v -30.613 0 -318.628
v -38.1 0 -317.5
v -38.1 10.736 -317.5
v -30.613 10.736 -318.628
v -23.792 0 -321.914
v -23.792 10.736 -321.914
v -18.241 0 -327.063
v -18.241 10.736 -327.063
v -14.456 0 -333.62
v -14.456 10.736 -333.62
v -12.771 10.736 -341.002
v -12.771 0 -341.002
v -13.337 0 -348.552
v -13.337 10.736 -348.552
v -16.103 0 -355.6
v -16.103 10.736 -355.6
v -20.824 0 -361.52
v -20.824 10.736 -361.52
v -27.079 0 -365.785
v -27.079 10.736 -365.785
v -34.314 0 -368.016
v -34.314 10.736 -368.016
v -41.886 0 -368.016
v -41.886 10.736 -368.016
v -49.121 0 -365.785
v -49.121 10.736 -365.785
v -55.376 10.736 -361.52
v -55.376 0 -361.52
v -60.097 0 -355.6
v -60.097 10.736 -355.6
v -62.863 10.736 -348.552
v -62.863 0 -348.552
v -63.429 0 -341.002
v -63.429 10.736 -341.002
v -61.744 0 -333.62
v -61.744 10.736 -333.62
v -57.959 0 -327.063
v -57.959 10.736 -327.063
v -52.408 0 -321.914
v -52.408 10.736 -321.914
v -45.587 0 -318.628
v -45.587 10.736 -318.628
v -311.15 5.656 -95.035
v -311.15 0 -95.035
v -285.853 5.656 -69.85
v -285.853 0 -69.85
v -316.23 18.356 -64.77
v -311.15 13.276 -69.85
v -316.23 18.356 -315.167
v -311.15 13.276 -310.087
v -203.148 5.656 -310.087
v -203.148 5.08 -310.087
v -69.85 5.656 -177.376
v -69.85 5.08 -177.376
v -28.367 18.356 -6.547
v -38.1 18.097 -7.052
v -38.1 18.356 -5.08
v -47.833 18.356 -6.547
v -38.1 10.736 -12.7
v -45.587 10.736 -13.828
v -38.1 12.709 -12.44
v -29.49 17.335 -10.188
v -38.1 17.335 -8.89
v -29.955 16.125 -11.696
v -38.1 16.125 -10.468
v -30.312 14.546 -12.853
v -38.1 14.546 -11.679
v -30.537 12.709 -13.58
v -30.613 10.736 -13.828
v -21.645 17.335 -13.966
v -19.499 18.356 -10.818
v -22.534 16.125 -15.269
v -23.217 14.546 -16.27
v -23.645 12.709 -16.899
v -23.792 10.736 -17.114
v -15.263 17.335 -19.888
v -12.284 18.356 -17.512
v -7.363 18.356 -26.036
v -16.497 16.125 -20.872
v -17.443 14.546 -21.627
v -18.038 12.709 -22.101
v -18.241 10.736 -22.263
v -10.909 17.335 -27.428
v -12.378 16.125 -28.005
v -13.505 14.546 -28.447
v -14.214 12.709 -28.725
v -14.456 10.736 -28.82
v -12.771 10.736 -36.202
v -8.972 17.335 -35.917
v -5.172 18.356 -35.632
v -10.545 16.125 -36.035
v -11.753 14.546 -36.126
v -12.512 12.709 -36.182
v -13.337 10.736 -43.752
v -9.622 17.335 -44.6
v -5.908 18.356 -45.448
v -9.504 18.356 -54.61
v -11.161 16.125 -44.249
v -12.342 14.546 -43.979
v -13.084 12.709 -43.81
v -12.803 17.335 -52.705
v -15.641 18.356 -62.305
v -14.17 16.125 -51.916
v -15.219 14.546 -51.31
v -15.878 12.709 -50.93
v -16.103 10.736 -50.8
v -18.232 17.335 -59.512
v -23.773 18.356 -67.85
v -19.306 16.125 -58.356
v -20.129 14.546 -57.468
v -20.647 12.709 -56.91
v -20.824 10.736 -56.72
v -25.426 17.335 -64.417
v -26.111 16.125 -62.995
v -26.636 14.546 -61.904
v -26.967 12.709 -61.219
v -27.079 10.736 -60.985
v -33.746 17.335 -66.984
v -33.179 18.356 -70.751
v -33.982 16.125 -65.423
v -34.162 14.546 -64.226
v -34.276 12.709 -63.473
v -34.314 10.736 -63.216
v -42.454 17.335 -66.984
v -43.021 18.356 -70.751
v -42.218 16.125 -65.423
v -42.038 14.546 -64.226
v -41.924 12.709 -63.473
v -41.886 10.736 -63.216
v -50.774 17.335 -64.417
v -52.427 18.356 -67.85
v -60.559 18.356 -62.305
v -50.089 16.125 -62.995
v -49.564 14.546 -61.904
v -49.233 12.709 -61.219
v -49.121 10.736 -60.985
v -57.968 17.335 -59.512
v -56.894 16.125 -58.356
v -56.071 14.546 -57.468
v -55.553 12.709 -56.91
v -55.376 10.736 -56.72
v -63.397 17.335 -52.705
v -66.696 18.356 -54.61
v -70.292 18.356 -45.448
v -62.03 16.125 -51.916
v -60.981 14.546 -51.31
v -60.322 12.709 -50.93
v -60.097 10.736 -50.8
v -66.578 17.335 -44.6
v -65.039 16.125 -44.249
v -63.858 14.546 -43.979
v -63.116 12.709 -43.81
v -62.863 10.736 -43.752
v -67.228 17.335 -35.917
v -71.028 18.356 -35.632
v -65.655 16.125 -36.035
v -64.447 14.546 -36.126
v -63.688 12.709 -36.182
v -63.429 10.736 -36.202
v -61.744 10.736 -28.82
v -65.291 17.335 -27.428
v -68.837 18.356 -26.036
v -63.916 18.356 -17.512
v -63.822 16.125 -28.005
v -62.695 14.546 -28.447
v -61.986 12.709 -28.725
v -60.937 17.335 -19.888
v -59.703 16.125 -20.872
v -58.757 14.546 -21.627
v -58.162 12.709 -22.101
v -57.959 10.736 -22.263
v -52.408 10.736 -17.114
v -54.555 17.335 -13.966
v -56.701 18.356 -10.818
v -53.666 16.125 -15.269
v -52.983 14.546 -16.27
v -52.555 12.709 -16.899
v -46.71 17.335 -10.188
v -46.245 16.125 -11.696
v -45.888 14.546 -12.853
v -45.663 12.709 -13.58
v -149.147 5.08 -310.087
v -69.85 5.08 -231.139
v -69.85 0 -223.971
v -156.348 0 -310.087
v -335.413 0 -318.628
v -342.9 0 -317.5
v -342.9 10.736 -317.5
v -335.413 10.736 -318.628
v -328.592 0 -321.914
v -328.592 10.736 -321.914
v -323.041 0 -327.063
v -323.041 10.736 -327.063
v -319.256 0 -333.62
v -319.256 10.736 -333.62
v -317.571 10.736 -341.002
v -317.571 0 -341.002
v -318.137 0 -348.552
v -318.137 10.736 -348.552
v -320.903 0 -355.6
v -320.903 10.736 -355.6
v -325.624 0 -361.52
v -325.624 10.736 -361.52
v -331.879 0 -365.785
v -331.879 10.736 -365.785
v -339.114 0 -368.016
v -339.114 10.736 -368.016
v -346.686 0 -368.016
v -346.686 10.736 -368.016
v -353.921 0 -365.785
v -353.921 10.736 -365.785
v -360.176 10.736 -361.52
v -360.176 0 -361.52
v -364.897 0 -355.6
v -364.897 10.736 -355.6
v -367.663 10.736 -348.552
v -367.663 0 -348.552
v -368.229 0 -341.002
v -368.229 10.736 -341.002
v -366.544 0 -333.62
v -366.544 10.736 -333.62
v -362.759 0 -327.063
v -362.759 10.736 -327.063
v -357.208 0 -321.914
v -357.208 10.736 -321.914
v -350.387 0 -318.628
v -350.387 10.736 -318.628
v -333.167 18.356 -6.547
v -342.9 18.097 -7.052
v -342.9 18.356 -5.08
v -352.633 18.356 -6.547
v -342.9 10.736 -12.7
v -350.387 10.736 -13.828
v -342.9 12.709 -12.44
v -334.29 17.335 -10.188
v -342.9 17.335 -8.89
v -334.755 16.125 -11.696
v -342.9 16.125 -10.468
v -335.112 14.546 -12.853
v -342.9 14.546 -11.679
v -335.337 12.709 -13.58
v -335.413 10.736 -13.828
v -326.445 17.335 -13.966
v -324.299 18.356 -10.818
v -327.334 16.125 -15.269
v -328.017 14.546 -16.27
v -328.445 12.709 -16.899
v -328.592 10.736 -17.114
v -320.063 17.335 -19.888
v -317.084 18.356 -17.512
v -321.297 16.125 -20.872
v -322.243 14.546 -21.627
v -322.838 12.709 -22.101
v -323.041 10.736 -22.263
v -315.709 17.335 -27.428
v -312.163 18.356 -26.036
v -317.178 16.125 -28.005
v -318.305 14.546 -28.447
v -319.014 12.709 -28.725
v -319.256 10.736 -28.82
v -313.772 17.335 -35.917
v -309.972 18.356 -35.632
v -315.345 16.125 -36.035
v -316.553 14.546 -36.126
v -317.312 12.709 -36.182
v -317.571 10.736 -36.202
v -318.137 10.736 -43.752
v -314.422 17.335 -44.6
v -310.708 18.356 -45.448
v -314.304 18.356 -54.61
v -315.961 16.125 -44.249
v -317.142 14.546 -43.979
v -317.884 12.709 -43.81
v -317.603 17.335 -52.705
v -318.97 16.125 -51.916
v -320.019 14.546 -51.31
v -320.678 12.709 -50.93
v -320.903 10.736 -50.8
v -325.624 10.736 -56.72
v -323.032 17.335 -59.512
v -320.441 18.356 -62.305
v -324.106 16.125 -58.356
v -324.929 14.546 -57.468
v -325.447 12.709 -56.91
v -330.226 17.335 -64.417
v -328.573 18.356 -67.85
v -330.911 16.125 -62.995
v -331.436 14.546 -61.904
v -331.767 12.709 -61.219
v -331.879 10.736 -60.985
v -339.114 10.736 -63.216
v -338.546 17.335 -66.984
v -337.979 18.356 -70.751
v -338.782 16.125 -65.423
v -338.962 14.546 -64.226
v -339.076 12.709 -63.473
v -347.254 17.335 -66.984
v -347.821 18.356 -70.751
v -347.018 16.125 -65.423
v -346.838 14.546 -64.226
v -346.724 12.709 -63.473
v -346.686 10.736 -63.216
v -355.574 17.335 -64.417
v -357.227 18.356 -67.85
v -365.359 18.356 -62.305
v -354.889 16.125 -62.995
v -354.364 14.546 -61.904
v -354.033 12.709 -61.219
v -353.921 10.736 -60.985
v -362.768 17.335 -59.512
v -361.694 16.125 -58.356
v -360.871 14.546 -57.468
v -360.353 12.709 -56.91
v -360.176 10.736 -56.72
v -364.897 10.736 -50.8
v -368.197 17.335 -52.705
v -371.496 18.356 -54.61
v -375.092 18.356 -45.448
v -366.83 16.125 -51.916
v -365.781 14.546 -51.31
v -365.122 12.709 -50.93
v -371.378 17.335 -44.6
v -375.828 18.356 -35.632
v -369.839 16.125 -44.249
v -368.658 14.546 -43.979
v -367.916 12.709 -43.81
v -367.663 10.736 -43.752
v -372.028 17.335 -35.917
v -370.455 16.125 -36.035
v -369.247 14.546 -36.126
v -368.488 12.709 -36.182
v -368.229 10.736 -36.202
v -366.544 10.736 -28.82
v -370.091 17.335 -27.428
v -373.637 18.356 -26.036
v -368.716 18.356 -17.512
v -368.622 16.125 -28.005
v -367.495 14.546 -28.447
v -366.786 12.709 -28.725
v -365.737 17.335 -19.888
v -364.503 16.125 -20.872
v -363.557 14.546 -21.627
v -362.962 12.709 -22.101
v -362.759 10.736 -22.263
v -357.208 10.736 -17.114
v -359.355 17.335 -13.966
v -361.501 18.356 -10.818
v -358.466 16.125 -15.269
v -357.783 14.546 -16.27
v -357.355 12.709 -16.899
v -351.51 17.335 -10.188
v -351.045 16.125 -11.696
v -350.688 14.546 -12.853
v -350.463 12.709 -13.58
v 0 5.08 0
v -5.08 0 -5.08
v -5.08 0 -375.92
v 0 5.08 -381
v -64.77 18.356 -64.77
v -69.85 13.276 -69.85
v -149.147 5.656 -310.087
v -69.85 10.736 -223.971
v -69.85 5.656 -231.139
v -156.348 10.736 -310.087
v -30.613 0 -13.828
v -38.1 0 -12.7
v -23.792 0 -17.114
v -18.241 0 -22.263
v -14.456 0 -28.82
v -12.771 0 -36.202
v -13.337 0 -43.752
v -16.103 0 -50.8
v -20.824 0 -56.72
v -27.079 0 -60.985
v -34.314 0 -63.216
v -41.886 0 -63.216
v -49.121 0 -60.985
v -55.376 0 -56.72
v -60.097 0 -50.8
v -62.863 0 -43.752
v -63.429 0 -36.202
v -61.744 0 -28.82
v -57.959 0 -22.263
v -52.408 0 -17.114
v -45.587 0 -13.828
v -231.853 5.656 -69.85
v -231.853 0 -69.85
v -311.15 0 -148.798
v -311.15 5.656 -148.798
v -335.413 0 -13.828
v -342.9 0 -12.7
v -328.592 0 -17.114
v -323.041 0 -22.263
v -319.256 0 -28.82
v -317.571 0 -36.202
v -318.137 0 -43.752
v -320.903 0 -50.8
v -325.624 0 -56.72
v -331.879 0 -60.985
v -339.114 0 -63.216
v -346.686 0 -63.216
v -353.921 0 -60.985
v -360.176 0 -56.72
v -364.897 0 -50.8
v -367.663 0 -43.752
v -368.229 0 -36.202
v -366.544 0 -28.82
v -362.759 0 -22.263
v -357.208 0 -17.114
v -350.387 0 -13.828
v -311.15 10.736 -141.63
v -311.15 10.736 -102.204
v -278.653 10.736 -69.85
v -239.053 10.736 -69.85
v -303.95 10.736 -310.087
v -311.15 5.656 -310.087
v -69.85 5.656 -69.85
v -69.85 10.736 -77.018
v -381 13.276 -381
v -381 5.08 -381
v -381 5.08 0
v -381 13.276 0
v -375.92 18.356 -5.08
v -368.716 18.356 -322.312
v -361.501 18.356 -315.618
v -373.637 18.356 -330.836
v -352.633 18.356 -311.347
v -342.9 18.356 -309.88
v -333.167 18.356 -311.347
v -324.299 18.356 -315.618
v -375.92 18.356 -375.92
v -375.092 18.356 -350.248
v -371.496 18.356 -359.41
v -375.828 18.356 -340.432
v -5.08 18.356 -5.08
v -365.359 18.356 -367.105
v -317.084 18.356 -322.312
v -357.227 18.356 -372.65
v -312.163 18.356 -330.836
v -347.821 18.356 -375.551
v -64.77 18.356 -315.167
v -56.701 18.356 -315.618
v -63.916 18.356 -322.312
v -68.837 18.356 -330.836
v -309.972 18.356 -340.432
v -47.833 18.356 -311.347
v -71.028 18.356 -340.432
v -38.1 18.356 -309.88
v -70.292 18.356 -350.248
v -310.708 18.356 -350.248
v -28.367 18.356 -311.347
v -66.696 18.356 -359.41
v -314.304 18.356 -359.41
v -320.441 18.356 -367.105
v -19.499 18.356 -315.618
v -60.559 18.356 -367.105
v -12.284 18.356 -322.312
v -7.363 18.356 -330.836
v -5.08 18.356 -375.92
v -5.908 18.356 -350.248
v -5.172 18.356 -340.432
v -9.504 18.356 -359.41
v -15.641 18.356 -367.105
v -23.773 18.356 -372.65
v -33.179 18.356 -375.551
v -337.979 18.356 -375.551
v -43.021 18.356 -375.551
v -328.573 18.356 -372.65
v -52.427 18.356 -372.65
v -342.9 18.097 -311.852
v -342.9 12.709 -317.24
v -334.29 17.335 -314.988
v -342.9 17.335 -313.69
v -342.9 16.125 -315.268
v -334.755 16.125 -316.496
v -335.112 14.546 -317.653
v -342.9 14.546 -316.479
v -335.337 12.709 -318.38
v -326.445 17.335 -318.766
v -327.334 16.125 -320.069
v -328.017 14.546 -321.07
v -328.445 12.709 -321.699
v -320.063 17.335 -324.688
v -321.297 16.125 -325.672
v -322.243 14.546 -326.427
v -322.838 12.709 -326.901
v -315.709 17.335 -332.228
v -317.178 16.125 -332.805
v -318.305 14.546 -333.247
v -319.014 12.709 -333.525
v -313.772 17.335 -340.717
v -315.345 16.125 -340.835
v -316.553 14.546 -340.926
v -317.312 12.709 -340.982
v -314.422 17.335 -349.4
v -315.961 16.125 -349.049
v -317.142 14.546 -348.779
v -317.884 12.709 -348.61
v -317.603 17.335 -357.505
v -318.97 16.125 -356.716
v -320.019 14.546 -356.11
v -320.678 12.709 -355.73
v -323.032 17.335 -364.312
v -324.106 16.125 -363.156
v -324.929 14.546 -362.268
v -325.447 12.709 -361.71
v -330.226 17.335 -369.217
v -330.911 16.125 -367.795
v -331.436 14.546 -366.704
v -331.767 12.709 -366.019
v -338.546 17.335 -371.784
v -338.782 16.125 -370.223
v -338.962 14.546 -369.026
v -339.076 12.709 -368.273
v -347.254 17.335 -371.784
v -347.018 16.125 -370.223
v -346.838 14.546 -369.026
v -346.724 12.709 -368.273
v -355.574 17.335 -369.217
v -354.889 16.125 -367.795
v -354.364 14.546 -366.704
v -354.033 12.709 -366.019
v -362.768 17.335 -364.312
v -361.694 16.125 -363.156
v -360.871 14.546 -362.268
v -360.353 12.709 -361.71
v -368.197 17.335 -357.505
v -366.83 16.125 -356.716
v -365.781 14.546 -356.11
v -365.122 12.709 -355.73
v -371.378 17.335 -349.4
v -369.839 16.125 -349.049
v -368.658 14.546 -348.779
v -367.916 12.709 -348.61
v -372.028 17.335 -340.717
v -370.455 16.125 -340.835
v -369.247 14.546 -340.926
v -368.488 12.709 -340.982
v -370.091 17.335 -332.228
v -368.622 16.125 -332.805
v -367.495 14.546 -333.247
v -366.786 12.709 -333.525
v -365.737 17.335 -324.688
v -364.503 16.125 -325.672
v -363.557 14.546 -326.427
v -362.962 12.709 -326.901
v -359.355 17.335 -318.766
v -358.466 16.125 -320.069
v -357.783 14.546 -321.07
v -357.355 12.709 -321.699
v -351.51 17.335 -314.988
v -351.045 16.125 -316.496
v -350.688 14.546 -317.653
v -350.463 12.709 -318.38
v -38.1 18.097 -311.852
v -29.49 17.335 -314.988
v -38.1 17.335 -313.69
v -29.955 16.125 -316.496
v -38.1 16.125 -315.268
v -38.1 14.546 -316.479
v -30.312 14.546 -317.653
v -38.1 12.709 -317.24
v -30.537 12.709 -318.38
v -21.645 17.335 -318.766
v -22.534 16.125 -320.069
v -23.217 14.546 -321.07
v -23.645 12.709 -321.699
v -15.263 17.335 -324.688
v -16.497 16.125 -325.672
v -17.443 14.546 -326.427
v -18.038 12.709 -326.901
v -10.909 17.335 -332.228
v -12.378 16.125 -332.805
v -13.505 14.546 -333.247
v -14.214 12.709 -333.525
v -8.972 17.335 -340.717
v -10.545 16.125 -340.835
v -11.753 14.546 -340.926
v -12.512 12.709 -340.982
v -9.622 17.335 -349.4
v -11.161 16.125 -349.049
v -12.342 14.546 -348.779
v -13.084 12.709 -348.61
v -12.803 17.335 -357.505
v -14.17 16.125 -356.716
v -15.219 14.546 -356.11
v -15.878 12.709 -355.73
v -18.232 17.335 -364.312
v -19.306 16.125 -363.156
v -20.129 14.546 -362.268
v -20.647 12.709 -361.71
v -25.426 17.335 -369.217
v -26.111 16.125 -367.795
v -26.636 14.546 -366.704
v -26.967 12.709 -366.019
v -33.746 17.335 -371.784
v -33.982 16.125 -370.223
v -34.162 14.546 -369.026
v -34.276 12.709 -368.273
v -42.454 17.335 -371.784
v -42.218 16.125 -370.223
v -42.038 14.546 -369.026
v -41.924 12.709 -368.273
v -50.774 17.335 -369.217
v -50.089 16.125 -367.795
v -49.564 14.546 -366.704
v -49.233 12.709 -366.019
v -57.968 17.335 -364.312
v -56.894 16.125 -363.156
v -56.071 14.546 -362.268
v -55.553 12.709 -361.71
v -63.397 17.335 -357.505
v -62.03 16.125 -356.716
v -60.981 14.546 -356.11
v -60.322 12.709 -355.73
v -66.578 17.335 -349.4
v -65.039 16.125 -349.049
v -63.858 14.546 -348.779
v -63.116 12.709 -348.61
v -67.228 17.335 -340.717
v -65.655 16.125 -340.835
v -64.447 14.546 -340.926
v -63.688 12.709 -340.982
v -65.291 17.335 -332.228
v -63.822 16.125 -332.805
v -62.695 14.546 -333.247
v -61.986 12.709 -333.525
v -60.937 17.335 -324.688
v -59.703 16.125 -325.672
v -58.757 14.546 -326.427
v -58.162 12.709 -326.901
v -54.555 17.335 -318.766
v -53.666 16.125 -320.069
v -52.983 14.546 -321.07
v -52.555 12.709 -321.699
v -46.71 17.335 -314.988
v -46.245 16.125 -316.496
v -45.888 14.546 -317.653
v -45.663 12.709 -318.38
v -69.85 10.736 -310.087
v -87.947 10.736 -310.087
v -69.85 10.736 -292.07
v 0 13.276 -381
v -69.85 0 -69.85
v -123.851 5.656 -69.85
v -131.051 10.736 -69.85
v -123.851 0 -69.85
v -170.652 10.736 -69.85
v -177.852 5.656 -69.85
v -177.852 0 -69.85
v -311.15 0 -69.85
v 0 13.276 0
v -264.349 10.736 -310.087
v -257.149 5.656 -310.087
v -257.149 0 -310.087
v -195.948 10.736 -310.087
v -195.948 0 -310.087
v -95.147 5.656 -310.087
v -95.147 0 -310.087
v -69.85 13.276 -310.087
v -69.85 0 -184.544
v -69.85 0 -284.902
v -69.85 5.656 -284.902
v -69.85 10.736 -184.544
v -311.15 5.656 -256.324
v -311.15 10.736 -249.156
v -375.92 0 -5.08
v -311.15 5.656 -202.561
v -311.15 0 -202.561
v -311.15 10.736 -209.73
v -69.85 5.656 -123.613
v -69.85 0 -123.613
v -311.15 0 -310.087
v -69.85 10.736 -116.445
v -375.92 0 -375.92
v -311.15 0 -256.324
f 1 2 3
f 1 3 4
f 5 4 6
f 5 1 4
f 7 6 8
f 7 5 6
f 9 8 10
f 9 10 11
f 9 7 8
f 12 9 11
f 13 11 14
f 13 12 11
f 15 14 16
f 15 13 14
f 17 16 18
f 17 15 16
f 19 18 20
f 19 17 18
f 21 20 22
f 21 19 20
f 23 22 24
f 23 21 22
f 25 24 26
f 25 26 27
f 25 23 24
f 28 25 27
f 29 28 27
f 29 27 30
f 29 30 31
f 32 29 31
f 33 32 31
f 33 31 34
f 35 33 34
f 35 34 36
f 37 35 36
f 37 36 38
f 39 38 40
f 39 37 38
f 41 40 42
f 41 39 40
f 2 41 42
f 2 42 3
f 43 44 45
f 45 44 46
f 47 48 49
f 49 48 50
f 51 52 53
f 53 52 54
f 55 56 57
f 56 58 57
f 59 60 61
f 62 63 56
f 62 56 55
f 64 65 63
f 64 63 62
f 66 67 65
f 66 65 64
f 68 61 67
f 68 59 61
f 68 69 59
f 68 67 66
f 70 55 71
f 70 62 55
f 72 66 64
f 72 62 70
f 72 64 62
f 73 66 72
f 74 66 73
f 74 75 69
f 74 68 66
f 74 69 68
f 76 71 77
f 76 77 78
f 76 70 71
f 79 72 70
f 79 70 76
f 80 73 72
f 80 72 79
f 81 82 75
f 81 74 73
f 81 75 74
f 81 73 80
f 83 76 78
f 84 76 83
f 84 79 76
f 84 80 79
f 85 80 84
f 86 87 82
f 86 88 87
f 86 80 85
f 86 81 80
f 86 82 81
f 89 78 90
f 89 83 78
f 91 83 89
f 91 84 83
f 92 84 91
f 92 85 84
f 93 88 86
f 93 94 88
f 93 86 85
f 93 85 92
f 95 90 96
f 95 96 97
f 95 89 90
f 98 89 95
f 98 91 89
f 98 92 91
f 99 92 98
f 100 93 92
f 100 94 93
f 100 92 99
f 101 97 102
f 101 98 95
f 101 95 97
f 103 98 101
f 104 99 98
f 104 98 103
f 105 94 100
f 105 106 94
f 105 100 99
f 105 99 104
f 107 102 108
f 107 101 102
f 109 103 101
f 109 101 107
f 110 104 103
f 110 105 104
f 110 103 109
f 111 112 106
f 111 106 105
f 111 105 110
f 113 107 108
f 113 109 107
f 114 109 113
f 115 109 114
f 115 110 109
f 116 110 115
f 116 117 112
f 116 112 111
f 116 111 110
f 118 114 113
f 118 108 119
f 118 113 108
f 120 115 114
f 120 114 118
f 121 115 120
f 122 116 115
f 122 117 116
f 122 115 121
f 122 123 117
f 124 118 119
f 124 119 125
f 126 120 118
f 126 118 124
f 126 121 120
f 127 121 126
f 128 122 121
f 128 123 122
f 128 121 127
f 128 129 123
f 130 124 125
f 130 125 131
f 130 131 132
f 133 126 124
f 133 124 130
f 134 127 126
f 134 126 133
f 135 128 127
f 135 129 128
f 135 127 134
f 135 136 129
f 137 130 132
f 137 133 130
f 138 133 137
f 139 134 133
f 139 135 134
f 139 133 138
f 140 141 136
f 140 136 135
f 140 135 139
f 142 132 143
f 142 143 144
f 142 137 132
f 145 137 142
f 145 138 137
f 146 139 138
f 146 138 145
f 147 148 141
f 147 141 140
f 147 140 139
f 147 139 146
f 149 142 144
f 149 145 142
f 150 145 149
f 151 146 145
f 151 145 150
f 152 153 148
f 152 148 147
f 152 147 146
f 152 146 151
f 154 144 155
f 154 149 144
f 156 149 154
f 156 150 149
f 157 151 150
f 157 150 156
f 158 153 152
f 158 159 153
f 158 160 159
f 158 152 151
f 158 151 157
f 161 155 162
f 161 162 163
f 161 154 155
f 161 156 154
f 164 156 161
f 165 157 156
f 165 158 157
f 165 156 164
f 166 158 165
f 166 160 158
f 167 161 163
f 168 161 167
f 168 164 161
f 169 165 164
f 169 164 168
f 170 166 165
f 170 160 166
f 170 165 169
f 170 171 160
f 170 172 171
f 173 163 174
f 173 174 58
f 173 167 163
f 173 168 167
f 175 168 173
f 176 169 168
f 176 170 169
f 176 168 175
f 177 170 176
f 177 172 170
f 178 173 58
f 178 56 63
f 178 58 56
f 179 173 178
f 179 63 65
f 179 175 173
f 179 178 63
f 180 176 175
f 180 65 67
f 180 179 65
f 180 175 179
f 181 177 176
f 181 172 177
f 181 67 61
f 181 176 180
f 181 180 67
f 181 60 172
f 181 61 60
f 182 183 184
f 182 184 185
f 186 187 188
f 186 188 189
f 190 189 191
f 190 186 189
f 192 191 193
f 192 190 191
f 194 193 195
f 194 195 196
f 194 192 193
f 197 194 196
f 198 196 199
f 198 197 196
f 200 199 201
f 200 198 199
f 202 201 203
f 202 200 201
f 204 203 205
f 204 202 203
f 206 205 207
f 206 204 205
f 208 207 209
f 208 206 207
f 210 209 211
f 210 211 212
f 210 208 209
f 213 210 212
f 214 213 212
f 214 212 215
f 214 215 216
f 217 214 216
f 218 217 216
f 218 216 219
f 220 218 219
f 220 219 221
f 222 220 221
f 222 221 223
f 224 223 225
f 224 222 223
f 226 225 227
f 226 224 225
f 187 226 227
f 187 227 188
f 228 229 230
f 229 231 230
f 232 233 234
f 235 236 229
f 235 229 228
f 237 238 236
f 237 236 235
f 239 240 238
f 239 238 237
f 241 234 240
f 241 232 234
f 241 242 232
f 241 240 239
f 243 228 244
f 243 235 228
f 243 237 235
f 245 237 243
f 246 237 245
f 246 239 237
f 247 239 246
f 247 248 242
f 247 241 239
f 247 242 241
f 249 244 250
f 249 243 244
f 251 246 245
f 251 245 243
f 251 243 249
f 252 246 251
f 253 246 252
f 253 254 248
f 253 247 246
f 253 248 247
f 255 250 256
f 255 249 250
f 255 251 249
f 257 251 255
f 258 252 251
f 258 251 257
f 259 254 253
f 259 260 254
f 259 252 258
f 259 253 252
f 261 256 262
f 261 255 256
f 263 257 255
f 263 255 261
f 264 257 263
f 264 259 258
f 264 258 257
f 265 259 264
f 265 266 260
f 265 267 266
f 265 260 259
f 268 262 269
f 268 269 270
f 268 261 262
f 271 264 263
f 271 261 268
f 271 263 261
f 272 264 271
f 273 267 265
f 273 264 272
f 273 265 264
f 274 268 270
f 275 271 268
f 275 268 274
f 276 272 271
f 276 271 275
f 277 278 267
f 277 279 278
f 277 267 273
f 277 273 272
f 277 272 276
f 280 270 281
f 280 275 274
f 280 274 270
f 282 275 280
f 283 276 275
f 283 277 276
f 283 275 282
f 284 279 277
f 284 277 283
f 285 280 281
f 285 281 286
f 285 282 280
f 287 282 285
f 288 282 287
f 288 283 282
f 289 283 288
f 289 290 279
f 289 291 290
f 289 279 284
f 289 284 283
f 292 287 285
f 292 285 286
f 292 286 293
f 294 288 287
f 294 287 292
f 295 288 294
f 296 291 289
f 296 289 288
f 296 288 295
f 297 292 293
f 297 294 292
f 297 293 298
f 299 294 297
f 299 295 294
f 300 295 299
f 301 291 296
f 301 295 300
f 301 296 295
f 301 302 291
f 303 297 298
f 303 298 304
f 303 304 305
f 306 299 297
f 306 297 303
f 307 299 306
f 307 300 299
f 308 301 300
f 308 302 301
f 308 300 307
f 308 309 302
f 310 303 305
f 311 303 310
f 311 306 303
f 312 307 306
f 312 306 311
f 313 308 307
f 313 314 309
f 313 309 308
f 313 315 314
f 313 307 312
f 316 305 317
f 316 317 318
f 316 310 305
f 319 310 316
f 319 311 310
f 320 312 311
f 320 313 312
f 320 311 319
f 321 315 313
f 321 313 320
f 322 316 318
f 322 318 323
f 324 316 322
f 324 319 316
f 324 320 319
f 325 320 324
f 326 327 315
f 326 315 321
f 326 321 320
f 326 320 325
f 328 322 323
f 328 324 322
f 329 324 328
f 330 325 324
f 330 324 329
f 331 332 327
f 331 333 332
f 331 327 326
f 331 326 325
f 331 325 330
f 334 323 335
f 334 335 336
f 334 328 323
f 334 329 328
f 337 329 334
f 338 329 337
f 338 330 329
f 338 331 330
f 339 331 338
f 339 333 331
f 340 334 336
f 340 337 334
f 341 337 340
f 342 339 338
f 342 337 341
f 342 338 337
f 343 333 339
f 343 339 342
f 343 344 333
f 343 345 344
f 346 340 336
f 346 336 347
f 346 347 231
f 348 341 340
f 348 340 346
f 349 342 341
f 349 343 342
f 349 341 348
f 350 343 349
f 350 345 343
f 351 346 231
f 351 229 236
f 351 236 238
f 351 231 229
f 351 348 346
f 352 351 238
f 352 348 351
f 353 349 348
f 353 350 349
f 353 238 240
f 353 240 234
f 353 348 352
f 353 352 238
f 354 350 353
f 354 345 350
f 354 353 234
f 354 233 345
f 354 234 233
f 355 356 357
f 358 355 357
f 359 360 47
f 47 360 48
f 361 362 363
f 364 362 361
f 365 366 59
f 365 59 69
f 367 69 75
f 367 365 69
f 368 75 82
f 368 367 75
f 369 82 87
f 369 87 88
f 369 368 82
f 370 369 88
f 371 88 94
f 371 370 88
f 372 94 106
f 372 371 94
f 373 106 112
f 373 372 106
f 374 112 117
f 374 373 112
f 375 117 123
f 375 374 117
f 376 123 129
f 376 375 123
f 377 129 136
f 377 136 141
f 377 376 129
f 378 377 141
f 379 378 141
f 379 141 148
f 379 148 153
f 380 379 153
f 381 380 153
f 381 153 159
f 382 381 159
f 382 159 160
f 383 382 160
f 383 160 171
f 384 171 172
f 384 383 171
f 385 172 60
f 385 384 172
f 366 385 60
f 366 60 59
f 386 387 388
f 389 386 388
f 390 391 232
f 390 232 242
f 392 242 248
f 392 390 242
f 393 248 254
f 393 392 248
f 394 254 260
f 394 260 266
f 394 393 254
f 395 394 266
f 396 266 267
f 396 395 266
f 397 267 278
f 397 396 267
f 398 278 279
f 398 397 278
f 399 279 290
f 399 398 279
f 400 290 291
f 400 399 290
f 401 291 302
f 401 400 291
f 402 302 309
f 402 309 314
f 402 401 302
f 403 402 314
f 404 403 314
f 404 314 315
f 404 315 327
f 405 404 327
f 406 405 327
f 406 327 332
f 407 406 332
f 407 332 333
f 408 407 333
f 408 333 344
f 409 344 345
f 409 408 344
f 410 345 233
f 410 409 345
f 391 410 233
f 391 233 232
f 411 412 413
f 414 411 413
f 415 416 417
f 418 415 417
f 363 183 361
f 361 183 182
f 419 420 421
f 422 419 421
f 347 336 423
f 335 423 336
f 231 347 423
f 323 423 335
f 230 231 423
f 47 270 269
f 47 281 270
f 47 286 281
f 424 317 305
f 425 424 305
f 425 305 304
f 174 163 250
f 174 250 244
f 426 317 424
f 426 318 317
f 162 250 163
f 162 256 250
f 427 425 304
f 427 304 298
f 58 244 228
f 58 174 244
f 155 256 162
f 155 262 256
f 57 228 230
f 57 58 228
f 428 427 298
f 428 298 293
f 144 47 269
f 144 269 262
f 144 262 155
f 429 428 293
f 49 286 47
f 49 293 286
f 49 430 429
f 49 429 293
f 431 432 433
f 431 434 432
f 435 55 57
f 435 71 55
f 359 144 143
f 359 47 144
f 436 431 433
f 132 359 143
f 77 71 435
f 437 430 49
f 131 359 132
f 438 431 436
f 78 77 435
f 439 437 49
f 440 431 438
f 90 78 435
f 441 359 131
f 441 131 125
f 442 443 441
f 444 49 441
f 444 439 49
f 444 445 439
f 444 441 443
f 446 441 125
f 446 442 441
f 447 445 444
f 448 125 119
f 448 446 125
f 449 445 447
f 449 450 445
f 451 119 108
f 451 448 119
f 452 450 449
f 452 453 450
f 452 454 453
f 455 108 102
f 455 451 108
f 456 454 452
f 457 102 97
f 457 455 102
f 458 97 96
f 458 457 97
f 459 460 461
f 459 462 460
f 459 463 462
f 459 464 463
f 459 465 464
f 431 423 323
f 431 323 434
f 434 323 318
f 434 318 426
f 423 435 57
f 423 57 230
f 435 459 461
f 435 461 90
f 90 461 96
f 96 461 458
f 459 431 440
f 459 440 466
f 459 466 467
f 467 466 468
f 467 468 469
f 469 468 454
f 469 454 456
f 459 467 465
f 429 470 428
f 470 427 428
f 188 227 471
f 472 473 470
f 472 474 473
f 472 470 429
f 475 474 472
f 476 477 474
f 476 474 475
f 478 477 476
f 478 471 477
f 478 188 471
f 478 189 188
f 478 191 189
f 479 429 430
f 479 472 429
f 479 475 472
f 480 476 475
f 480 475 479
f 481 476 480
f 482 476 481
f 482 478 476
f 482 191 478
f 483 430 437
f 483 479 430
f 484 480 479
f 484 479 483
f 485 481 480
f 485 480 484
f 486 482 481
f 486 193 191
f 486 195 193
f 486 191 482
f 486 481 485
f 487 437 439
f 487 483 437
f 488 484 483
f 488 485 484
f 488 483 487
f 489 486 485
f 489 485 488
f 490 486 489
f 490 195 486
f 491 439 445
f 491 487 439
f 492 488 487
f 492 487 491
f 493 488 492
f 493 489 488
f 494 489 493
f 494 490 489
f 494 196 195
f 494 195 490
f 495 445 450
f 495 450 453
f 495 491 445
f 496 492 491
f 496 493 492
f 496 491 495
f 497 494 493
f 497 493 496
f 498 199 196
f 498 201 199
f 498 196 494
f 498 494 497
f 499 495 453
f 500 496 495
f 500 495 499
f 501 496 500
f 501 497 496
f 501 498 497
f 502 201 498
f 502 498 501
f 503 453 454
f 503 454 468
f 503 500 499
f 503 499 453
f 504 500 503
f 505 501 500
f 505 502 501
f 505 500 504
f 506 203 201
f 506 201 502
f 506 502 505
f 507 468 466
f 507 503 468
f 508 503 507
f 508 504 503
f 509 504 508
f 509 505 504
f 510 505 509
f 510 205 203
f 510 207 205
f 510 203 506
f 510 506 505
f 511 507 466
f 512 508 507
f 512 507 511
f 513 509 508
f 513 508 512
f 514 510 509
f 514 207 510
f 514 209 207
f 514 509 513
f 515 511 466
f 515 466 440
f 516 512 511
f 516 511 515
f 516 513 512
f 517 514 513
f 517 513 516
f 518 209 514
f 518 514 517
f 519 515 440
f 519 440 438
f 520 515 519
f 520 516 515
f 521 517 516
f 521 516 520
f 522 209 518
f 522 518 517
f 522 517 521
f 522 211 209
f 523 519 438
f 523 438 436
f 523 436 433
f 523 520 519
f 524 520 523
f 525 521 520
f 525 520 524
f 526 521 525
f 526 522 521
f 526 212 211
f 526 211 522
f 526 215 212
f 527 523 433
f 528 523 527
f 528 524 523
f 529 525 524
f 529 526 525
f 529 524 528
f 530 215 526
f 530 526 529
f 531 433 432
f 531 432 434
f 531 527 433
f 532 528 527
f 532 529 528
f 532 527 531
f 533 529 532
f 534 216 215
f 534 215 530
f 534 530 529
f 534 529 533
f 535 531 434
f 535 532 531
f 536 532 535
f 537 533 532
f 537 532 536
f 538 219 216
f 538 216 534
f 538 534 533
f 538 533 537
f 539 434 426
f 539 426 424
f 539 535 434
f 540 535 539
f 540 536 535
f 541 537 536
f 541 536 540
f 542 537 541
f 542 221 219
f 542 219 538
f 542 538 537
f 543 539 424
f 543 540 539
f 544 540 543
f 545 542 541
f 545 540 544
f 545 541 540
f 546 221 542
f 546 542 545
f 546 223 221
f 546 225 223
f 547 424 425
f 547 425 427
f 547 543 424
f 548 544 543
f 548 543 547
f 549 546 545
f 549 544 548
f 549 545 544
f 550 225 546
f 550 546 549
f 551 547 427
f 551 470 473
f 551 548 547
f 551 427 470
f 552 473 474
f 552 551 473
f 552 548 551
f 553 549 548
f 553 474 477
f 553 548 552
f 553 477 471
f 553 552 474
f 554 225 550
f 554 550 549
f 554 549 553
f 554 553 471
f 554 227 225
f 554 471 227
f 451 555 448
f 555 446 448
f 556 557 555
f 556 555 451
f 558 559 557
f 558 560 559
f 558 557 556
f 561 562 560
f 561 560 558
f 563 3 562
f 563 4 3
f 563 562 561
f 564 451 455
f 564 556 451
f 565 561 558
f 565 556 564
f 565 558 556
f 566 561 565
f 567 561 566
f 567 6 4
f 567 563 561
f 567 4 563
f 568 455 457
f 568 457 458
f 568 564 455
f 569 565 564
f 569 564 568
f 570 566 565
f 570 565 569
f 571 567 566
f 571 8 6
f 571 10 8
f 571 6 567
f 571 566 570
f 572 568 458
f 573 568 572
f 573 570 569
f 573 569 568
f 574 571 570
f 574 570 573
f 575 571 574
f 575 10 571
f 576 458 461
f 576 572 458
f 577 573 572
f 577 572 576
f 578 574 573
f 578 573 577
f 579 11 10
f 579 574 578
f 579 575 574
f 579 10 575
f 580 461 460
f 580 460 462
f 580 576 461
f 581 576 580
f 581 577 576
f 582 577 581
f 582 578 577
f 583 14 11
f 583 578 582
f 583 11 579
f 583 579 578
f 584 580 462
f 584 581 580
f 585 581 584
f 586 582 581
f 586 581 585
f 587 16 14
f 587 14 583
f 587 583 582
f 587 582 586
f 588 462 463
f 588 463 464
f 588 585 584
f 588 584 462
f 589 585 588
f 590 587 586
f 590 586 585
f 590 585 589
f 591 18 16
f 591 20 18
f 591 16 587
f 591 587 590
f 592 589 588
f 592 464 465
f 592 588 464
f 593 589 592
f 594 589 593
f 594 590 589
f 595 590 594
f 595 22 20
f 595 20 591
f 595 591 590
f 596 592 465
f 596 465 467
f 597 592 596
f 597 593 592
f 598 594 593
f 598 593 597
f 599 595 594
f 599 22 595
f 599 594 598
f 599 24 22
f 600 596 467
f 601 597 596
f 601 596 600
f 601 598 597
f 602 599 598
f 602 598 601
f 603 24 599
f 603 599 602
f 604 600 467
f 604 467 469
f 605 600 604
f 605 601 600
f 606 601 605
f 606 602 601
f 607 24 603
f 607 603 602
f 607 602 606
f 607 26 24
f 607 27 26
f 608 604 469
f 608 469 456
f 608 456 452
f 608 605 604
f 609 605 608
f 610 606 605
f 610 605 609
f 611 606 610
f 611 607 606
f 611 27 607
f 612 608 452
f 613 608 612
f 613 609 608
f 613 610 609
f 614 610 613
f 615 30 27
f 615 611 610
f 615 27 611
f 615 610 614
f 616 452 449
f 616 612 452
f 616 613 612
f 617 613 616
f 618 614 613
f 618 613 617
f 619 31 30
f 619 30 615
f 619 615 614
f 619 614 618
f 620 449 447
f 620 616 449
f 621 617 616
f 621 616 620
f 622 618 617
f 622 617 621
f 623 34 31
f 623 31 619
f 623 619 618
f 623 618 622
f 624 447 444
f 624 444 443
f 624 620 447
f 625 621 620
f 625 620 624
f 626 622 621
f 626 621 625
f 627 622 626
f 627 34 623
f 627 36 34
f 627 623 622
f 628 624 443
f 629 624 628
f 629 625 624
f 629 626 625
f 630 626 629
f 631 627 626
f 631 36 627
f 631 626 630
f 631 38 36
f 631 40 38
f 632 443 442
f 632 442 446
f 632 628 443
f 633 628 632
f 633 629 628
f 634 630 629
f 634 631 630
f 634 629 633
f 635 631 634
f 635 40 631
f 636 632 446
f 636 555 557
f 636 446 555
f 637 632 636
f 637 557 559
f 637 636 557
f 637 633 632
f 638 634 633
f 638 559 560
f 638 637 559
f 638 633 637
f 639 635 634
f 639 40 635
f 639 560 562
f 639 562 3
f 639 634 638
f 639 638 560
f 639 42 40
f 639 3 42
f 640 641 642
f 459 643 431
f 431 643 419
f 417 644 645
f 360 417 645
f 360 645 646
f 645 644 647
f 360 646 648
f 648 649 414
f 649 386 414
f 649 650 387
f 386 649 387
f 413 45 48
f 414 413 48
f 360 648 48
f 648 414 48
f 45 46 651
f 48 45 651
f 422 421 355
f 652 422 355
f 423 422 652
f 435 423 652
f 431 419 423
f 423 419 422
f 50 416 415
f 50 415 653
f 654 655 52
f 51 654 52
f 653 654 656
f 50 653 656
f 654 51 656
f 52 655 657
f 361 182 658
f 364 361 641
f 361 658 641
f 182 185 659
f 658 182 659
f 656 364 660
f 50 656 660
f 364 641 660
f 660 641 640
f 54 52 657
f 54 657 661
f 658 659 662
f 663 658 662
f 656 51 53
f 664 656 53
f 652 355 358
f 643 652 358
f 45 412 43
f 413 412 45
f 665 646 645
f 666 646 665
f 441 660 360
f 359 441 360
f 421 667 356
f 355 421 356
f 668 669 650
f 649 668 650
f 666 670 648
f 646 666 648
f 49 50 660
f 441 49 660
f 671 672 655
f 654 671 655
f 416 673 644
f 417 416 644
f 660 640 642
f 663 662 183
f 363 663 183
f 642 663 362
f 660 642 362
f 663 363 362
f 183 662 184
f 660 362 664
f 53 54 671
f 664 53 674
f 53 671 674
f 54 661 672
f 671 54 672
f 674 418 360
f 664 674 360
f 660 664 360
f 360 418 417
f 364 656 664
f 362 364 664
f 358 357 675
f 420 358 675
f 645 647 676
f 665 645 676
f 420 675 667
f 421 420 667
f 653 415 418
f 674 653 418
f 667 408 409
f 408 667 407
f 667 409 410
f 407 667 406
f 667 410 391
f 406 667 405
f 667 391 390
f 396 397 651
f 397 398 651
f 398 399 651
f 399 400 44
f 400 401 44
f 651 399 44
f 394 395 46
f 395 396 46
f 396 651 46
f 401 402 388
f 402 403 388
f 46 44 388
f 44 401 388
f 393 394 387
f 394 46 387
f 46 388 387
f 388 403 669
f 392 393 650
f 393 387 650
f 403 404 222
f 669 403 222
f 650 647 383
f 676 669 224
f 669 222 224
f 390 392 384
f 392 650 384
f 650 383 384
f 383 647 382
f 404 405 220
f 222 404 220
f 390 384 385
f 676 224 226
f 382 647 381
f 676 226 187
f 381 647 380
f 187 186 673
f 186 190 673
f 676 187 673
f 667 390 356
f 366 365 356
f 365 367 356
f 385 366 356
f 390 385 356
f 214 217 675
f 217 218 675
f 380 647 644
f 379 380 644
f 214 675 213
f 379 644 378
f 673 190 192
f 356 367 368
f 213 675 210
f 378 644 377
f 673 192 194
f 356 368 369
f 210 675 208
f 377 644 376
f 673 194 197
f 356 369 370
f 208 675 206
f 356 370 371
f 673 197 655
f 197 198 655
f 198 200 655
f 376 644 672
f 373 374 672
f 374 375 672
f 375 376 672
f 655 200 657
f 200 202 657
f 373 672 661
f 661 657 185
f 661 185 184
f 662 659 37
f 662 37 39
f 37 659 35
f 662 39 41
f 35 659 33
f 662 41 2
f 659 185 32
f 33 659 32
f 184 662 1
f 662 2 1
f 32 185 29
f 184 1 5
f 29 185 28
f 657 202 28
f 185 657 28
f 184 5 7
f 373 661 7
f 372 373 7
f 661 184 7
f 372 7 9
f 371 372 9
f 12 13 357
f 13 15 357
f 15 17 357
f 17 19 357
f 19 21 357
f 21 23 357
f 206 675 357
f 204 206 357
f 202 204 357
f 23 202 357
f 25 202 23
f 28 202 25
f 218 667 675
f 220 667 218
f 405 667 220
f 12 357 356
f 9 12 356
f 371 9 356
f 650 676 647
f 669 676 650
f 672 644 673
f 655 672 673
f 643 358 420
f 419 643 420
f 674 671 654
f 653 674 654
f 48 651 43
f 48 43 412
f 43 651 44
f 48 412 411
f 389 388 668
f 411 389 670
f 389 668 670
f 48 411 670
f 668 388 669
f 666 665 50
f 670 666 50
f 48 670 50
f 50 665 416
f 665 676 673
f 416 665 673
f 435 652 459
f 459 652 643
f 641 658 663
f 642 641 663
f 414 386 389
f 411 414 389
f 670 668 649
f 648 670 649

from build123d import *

# Parameters (mm, degrees)
SKETCH1_R           = 25.4
BOSS_EXTRUDE2_DEPTH = 18.356350904
CUT_EXTRUDE1_DEPTH  = 7.62
FILLET1_R           = 7.62
CHAMFER1_SIZE       = 5.08
CHAMFER2_SIZE       = 5.08
CHAMFER3_SIZE       = 5.08
CHAMFER4_SIZE       = 5.08
CHAMFER8_SIZE       = 5.08


with BuildPart() as part:
    # Sketch1 → Boss-Extrude2 (new body)
    with BuildSketch(Plane(origin=(0, 0, 0), x_dir=(1, 0, 0), z_dir=(0, 1, 0))):
        Polygon((-342.9, 381), (-381, 381), (-381, 0), (-342.9, 0), (-38.1, 0), (0, 0), (0, 381), (-38.1, 381), align=None)
        with Locations(Location((-342.9, 38.1, 0), (0, 0, 270))):
            Circle(SKETCH1_R, mode=Mode.SUBTRACT)
        Polygon((-285.853349775, 69.85), (-311.15, 69.85), (-311.15, 95.035246339), align=None, mode=Mode.SUBTRACT)
        Polygon((-311.15, 148.798269562), (-311.15, 190.5), (-311.15, 202.561292784), (-177.851674887, 69.85), (-231.852512331, 69.85), align=None, mode=Mode.SUBTRACT)
        with Locations(Location((-38.1, 38.1, 0), (0, 0, 270))):
            Circle(SKETCH1_R, mode=Mode.SUBTRACT)
        Polygon((-311.15, 256.324316007), (-311.15, 310.08733923), (-69.85, 69.85), (-123.850837444, 69.85), align=None, mode=Mode.SUBTRACT)
        with Locations(Location((-342.9, 342.9, 0), (0, 0, 270))):
            Circle(SKETCH1_R, mode=Mode.SUBTRACT)
        Polygon((-69.85, 177.376046445), (-69.85, 123.613023223), (-257.149162556, 310.08733923), (-203.148325113, 310.08733923), align=None, mode=Mode.SUBTRACT)
        Polygon((-149.147487669, 310.08733923), (-95.146650225, 310.08733923), (-69.85, 284.902092891), (-69.85, 231.139069668), align=None, mode=Mode.SUBTRACT)
        with Locations(Location((-38.1, 342.9, 0), (0, 0, 270))):
            Circle(SKETCH1_R, mode=Mode.SUBTRACT)
    extrude(amount=BOSS_EXTRUDE2_DEPTH)

    # Sketch3 → Cut-Extrude1 (cut)
    with BuildSketch(Plane(origin=(0, 18.356350904, 0), x_dir=(1, 0, 0), z_dir=(0, 1, 0))):
        Polygon((-69.85, 177.376046445), (-69.85, 310.08733923), (-311.15, 310.08733923), (-311.15, 69.85), (-69.85, 69.85), align=None)
    extrude(amount=-CUT_EXTRUDE1_DEPTH, mode=Mode.SUBTRACT)

    # Fillet1
    fillet1_edges = [part.edges().sort_by_distance(p)[0] for p in [
        (-38.1, 18.356350904, -63.5),
        (-38.1, 18.356350904, -368.3),
        (-342.9, 18.356350904, -63.5),
        (-342.9, 18.356350904, -368.3),
    ]]
    fillet(fillet1_edges, radius=FILLET1_R)

    # Chamfer1
    chamfer1_edges = [part.edges().sort_by_distance(p)[0] for p in [
        (-69.85, 18.356350904, -189.968669615),
        (-190.5, 18.356350904, -310.08733923),
        (-190.5, 18.356350904, -69.85),
        (-311.15, 18.356350904, -189.968669615),
    ]]
    chamfer(chamfer1_edges, length=CHAMFER1_SIZE)

    # Chamfer2
    chamfer2_edges = [part.edges().sort_by_distance(p)[0] for p in [
        (-298.501674887, 10.736350904, -82.442623169),
        (-271.501256165, 10.736350904, -109.324134781),
        (-244.500837444, 10.736350904, -136.205646392),
        (-217.500418722, 10.736350904, -163.087158004),
        (-136.499162556, 10.736350904, -243.731692838),
        (-109.498743835, 10.736350904, -270.613204449),
        (-190.5, 10.736350904, -189.968669615),
        (-163.499581278, 10.736350904, -216.850181226),
        (-82.498325113, 10.736350904, -297.49471606),
    ]]
    chamfer(chamfer2_edges, length=CHAMFER2_SIZE)

    # Chamfer3
    chamfer3_edges = [part.edges().sort_by_distance(p)[0] for p in [
        (-381, 18.356350904, -190.5),
        (-190.5, 18.356350904, 0),
        (0, 18.356350904, -190.5),
        (-190.5, 18.356350904, -381),
    ]]
    chamfer(chamfer3_edges, length=CHAMFER3_SIZE - 0.0001)  # a hair under: the kernel refuses the full size

    # Chamfer4
    chamfer4_edges = [part.edges().sort_by_distance(p)[0] for p in [
        (-190.5, 0, -381),
        (0, 0, -190.5),
        (-190.5, 0, 0),
        (-381, 0, -190.5),
    ]]
    chamfer(chamfer4_edges, length=CHAMFER4_SIZE)

    # Chamfer8
    chamfer8_edges = [part.edges().sort_by_distance(p)[0] for p in [
        (-136.499162556, 0, -243.731692838),
        (-109.498743835, 0, -270.613204449),
    ]]
    chamfer(chamfer8_edges, length=CHAMFER8_SIZE)


solid = part.part
